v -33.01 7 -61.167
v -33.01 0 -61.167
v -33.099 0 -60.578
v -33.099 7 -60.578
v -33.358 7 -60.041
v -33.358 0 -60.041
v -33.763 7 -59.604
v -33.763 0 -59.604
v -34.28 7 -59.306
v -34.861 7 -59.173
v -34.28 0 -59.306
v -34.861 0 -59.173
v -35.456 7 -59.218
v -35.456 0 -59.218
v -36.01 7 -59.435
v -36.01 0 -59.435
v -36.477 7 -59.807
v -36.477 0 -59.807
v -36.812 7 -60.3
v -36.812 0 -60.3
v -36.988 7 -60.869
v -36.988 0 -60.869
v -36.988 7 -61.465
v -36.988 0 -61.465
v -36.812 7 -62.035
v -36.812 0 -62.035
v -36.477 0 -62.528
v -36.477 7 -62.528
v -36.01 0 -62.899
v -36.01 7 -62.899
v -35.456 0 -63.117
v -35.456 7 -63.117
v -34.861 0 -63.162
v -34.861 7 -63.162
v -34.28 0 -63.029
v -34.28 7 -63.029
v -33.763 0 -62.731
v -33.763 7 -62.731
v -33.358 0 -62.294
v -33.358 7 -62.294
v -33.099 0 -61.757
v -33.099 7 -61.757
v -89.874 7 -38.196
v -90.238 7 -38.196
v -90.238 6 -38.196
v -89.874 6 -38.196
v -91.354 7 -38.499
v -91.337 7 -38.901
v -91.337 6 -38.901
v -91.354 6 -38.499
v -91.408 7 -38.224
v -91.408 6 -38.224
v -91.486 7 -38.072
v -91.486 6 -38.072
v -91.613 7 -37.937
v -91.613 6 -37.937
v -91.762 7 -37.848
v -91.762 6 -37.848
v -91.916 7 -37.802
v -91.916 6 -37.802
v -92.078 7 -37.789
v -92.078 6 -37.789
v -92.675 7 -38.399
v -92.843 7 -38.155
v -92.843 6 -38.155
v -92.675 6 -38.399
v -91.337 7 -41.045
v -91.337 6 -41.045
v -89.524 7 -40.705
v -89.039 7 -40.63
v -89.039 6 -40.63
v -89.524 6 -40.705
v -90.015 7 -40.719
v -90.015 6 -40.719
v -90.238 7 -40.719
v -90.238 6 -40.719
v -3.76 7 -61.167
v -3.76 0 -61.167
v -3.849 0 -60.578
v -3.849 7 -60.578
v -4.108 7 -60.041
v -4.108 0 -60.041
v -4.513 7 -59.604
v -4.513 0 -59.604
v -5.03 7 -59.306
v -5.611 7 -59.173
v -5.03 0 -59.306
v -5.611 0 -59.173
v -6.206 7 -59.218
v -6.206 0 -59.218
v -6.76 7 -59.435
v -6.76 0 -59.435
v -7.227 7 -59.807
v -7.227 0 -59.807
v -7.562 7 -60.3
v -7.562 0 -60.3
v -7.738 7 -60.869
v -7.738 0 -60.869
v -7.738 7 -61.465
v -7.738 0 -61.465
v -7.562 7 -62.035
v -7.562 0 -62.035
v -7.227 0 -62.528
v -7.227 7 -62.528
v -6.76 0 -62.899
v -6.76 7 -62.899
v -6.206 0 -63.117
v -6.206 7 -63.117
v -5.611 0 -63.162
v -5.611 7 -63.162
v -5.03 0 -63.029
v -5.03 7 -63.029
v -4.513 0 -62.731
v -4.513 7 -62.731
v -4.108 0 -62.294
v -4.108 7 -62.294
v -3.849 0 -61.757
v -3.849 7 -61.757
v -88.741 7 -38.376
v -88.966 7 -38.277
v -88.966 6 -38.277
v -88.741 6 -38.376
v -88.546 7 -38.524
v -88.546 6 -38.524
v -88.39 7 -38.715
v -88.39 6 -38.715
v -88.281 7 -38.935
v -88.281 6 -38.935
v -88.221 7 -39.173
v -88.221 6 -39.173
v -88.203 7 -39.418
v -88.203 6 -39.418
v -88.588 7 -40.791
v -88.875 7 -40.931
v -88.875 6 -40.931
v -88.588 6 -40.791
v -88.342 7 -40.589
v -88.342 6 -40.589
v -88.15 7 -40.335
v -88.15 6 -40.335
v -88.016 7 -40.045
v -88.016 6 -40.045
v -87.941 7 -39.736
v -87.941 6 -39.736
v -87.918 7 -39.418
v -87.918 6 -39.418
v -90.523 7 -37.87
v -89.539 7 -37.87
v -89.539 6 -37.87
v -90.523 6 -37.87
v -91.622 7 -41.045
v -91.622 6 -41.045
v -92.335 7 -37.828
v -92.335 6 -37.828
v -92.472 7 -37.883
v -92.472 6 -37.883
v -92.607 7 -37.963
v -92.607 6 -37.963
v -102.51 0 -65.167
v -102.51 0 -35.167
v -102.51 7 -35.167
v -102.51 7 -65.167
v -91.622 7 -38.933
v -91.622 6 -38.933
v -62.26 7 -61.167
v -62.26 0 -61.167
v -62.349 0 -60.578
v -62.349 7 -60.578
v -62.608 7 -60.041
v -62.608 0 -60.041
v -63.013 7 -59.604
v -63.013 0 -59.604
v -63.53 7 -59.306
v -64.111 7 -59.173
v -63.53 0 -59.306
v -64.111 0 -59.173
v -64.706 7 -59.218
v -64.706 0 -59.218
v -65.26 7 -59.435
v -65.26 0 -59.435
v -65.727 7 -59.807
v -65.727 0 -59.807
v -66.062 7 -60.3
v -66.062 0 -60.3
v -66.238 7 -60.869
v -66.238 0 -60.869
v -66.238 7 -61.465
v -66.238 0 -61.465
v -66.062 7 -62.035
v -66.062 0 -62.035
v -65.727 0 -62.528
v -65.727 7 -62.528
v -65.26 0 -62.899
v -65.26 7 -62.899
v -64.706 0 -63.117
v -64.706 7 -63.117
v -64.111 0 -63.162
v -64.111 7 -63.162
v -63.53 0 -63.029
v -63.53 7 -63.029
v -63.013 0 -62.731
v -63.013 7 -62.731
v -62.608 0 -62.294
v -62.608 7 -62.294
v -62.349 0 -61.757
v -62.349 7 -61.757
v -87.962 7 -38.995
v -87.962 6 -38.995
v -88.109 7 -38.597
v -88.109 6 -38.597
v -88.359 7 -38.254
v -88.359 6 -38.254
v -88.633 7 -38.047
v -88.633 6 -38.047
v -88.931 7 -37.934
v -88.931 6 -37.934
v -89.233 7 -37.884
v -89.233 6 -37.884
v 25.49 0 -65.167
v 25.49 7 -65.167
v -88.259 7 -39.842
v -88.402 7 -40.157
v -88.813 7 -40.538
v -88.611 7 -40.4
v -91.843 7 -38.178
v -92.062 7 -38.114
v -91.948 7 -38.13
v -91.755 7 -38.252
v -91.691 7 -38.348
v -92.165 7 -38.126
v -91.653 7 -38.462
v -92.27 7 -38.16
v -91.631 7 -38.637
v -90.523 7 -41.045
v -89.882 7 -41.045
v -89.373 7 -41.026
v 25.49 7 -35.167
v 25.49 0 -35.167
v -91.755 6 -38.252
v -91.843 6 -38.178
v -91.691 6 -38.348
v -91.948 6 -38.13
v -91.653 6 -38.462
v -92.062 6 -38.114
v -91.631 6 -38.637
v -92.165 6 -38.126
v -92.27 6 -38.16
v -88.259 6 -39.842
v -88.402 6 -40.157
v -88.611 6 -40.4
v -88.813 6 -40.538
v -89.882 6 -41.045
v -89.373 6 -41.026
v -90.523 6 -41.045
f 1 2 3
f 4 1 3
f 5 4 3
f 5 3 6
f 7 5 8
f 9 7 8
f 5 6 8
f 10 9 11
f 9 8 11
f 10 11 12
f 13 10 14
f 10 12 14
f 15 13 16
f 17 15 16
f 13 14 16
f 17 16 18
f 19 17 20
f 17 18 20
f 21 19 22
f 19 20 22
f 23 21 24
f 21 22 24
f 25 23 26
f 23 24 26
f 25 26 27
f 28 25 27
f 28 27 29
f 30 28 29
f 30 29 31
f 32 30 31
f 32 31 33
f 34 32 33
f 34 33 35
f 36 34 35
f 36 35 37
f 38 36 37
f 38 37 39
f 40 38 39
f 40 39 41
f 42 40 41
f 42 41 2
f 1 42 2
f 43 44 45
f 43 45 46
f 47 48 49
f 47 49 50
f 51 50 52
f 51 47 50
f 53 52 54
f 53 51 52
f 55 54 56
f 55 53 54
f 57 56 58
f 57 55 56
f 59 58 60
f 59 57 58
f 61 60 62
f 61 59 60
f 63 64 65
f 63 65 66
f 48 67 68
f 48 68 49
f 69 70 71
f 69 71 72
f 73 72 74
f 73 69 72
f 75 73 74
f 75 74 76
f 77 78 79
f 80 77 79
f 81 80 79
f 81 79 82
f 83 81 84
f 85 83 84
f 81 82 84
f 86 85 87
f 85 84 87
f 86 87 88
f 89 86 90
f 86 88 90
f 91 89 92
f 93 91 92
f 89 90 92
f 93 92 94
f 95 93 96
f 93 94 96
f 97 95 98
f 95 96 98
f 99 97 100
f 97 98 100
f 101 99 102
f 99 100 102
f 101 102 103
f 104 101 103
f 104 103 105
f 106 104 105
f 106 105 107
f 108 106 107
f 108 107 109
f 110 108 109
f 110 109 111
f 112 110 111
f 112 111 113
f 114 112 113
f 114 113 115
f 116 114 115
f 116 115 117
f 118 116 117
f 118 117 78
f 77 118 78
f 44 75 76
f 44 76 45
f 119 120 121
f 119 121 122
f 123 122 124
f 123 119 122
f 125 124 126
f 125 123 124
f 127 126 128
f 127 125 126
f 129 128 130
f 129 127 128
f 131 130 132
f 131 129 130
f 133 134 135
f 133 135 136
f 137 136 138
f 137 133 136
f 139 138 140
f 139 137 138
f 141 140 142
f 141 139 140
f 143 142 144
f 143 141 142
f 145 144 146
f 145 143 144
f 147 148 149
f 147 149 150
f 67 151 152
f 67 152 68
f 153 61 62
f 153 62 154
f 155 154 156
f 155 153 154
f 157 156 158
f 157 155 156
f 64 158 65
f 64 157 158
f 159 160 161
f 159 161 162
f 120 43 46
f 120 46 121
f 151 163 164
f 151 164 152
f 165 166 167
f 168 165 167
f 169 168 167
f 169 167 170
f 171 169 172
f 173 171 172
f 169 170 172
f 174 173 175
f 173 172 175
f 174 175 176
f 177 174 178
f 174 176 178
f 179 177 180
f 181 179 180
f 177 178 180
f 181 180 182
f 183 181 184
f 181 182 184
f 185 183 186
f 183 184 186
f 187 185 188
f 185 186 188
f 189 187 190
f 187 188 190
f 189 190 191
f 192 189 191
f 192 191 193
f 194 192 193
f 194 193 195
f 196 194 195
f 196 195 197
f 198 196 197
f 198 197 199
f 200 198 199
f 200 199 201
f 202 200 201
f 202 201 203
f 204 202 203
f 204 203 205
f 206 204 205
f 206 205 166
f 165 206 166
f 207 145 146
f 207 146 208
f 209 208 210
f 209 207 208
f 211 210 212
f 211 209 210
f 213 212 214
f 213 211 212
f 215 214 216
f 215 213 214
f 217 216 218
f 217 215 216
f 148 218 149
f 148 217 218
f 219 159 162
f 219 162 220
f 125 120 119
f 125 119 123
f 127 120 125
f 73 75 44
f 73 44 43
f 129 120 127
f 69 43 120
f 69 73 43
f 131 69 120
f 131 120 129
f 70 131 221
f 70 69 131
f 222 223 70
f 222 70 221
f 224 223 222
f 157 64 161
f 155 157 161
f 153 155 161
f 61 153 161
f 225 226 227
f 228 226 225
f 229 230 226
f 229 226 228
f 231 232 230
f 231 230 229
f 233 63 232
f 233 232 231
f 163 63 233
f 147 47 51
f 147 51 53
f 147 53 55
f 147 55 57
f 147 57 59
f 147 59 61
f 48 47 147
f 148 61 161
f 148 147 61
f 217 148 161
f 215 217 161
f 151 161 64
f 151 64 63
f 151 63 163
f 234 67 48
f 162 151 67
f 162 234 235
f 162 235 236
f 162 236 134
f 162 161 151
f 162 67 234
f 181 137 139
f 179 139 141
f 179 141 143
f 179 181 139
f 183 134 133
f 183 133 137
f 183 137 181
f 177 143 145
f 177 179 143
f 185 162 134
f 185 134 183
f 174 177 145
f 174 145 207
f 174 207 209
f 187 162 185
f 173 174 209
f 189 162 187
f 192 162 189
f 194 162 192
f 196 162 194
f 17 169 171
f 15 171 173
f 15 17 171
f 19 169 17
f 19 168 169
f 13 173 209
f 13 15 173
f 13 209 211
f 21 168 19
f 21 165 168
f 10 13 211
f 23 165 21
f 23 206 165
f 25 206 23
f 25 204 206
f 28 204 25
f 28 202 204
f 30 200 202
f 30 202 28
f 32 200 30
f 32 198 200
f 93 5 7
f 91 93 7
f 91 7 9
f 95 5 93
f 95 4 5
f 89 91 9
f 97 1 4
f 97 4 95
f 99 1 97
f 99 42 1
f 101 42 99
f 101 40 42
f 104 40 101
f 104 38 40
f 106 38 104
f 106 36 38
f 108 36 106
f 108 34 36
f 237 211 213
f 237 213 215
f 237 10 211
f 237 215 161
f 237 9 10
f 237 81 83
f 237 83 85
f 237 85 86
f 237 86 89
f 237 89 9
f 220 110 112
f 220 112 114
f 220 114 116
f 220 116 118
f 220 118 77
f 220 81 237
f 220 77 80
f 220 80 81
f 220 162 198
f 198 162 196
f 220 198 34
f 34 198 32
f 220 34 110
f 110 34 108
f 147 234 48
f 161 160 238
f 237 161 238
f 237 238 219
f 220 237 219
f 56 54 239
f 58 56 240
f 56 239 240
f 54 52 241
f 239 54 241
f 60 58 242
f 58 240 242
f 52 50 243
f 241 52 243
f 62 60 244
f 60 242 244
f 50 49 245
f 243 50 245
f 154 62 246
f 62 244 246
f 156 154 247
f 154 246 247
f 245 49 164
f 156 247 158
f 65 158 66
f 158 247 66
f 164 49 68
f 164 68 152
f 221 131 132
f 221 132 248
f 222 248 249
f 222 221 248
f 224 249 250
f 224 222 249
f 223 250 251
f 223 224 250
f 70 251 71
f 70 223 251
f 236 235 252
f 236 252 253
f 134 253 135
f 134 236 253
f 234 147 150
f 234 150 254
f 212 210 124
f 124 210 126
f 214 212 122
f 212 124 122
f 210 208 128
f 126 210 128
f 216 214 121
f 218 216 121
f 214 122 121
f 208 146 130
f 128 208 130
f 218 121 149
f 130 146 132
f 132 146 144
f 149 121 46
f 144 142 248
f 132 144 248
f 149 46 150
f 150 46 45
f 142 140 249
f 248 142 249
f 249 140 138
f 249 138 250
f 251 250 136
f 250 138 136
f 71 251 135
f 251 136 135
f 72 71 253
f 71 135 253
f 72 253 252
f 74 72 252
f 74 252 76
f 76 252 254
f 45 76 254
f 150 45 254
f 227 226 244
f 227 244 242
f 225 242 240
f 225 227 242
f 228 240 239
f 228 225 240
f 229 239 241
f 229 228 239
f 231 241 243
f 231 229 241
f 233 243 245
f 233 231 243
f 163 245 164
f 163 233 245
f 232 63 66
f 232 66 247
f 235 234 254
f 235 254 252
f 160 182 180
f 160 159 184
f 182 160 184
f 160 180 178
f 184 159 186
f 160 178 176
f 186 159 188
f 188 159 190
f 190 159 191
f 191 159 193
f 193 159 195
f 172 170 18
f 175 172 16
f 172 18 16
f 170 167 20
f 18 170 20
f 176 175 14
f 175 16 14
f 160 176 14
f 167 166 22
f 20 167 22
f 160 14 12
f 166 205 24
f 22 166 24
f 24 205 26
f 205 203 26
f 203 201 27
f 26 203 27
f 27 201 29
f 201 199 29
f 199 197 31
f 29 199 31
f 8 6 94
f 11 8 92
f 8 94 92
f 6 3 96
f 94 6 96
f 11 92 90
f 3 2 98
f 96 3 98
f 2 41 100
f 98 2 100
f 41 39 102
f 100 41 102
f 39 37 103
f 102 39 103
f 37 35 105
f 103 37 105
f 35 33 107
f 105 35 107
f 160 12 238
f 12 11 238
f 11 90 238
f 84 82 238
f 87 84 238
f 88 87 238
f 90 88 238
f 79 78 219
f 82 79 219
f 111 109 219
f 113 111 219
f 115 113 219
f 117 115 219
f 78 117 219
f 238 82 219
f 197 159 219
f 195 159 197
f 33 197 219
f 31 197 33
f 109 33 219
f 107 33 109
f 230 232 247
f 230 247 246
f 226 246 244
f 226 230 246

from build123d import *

# Parameters (mm, degrees)
SKETCH1_W           = 128
SKETCH1_H           = 30
BOSS_EXTRUDE1_DEPTH = 7
SKETCH2_R           = 2
CUT_EXTRUDE1_DEPTH  = 10
CUT_EXTRUDE2_DEPTH  = 1


with BuildPart() as part:
    # Sketch1 → Boss-Extrude1 (new body)
    with BuildSketch(Plane(origin=(0, 0, 0), x_dir=(1, 0, 0), z_dir=(0, 1, 0))):
        with Locations((-38.510460251, 50.167364017)):
            Rectangle(SKETCH1_W, SKETCH1_H)
    extrude(amount=BOSS_EXTRUDE1_DEPTH)

    # Sketch2 → Cut-Extrude1 (cut)
    with BuildSketch(Plane.XZ):
        with Locations((-64.260460251, -61.167364017)):
            Circle(SKETCH2_R)
        with Locations((-35.010460251, -61.167364017)):
            Circle(SKETCH2_R)
        with Locations((-5.760460251, -61.167364017)):
            Circle(SKETCH2_R)
    extrude(amount=-CUT_EXTRUDE1_DEPTH, mode=Mode.SUBTRACT)

    # Sketch3 → Cut-Extrude2 (cut)
    with BuildSketch(Plane(origin=(0, 7, 0), x_dir=(1, 0, 0), z_dir=(0, 1, 0))):
        with BuildLine():
            Line((-91.622128911, 41.045104689), (-91.337193013, 41.045104689))
            Line((-91.337193013, 41.045104689), (-91.337193013, 38.901089264))
            add(Edge.make_bspline(
                [(-91.337193013, 38.901089264), (-91.337477782, 38.861442431), (-91.338024574, 38.785315673), (-91.341031218, 38.675665781), (-91.346595158, 38.575543802), (-91.354700491, 38.484722068), (-91.365513845, 38.403485107), (-91.377888206, 38.331205218), (-91.392867674, 38.268485649), (-91.415425111, 38.19805929), (-91.452412907, 38.120821696), (-91.508081578, 38.037405238), (-91.577235614, 37.964440644), (-91.657337266, 37.901074244), (-91.749086623, 37.850585184), (-91.850594294, 37.814340129), (-91.961235412, 37.792232281), (-92.037978983, 37.789897381), (-92.077517533, 37.788694433)],
                knots=[0, 0, 0, 0, 0.000118942, 0.000228383, 0.000329037, 0.000419729, 0.000501854, 0.000574841, 0.000639631, 0.000695143, 0.000796428, 0.00089539, 0.00099483, 0.001096746, 0.001200653, 0.001307483, 0.001418995, 0.001537501, 0.001537501, 0.001537501, 0.001537501], degree=3))
            add(Edge.make_bspline(
                [(-92.077517533, 37.788694433), (-92.108322615, 37.7896747), (-92.17030448, 37.791647061), (-92.26255248, 37.807723187), (-92.354538559, 37.83250274), (-92.446750944, 37.868790809), (-92.54101147, 37.918144459), (-92.638596771, 37.982719257), (-92.740762094, 38.062394999), (-92.808056932, 38.123207811), (-92.843282757, 38.155040587)],
                knots=[0, 0, 0, 0, 9.2363e-05, 0.00018584, 0.000280112, 0.000377788, 0.000482474, 0.000598727, 0.000728365, 0.000870765, 0.000870765, 0.000870765, 0.000870765], degree=3))
            Line((-92.843282757, 38.155040587), (-92.675374103, 38.399271356))
            add(Edge.make_bspline(
                [(-92.675374103, 38.399271356), (-92.636636673, 38.372558361), (-92.563495353, 38.322120743), (-92.455994896, 38.257235898), (-92.360747479, 38.201605212), (-92.298442234, 38.17325493), (-92.269594856, 38.160128728)],
                knots=[0, 0, 0, 0, 0.000141121, 0.000266456, 0.000376665, 0.000471687, 0.000471687, 0.000471687, 0.000471687], degree=3))
            add(Edge.make_bspline(
                [(-92.269594856, 38.160128728), (-92.252101231, 38.15327122), (-92.217792336, 38.13982212), (-92.165336728, 38.124812627), (-92.113180516, 38.116609869), (-92.078602322, 38.11508466), (-92.061617092, 38.114335458)],
                knots=[0, 0, 0, 0, 5.6351e-05, 0.000110517, 0.000163322, 0.000214303, 0.000214303, 0.000214303, 0.000214303], degree=3))
            add(Edge.make_bspline(
                [(-92.061617092, 38.114335458), (-92.039679848, 38.115263225), (-91.996318006, 38.117097078), (-91.93330424, 38.13328892), (-91.873017311, 38.158003486), (-91.817618408, 38.194190588), (-91.766559521, 38.237217663), (-91.724429243, 38.289247756), (-91.689307171, 38.346911185), (-91.668171021, 38.401495289), (-91.654704692, 38.451276232), (-91.646157931, 38.497026291), (-91.638684289, 38.550512775), (-91.632169595, 38.611799528), (-91.62835554, 38.681009251), (-91.624076299, 38.757938723), (-91.622529384, 38.842781901), (-91.622266475, 38.90193755), (-91.622128911, 38.932890146)],
                knots=[0, 0, 0, 0, 6.5707e-05, 0.000129879, 0.000194019, 0.00026036, 0.000327553, 0.000393515, 0.000460269, 0.000529361, 0.000568242, 0.000614893, 0.000668861, 0.000730249, 0.000799717, 0.00087677, 0.000961382, 0.001054243, 0.001054243, 0.001054243, 0.001054243], degree=3))
            Line((-91.622128911, 38.932890146), (-91.622128911, 41.045104689))
        make_face()
        with BuildLine():
            Line((-90.523090449, 37.870104689), (-90.523090449, 41.045104689))
            Line((-90.523090449, 41.045104689), (-89.88198468, 41.045104689))
            add(Edge.make_bspline(
                [(-89.88198468, 41.045104689), (-89.826223526, 41.044703215), (-89.718493268, 41.043927569), (-89.562816262, 41.039009593), (-89.418776706, 41.03030967), (-89.286848327, 41.017637314), (-89.166668942, 41.002077062), (-89.058575061, 40.982573124), (-88.96200776, 40.959542427), (-88.902617625, 40.939906911), (-88.874532757, 40.930621516)],
                knots=[0, 0, 0, 0, 0.000167284, 0.000323191, 0.000467206, 0.000600108, 0.000720732, 0.000830638, 0.000929518, 0.001018226, 0.001018226, 0.001018226, 0.001018226], degree=3))
            add(Edge.make_bspline(
                [(-88.874532757, 40.930621516), (-88.837798243, 40.916623662), (-88.765162233, 40.888945378), (-88.661741486, 40.83673359), (-88.56438205, 40.777575991), (-88.472561826, 40.711394601), (-88.388378219, 40.636315513), (-88.308542484, 40.555528014), (-88.236320556, 40.466094306), (-88.170182316, 40.369869138), (-88.110550682, 40.267986062), (-88.058717303, 40.160639213), (-88.015669752, 40.048373746), (-87.979934468, 39.931501862), (-87.951770896, 39.809766576), (-87.932555858, 39.683026141), (-87.919882174, 39.551781447), (-87.918608499, 39.462723184), (-87.917962244, 39.417535579)],
                knots=[0, 0, 0, 0, 0.000117869, 0.000233066, 0.000346943, 0.000459403, 0.000572066, 0.000684957, 0.000799786, 0.0009164, 0.001034974, 0.001153596, 0.001273599, 0.001395318, 0.001519979, 0.001648073, 0.001779649, 0.001915175, 0.001915175, 0.001915175, 0.001915175], degree=3))
            add(Edge.make_bspline(
                [(-87.917962244, 39.417535579), (-87.918532808, 39.378291455), (-87.919657162, 39.300956811), (-87.929753042, 39.18698257), (-87.944427275, 39.076389544), (-87.96714594, 38.969704374), (-87.994725363, 38.865992347), (-88.030071414, 38.766358811), (-88.070562186, 38.669889784), (-88.117778861, 38.577889646), (-88.169614261, 38.490728301), (-88.225241842, 38.408563357), (-88.284602273, 38.332567263), (-88.348261597, 38.262509879), (-88.415397168, 38.198496819), (-88.486448525, 38.139993348), (-88.561599007, 38.088144188), (-88.64051202, 38.040911882), (-88.725489651, 37.999709131), (-88.818141473, 37.964847622), (-88.918862613, 37.935958193), (-89.027405845, 37.911854594), (-89.143958714, 37.89273447), (-89.268635491, 37.879919814), (-89.401244618, 37.871253939), (-89.492302951, 37.870495211), (-89.539171178, 37.870104689)],
                knots=[0, 0, 0, 0, 0.000117706, 0.000231952, 0.000343037, 0.000452182, 0.00055895, 0.000664755, 0.000769064, 0.000872602, 0.000974698, 0.001073133, 0.001170083, 0.001263736, 0.001356857, 0.001448148, 0.00153954, 0.00163051, 0.001723812, 0.001822446, 0.001927109, 0.0020379, 0.002155845, 0.002281218, 0.002413768, 0.002554351, 0.002554351, 0.002554351, 0.002554351], degree=3))
            Line((-89.539171178, 37.870104689), (-90.523090449, 37.870104689))
        make_face()
        with BuildLine():
            Line((-90.238154552, 38.195745715), (-89.873716451, 38.195745715))
            add(Edge.make_bspline(
                [(-89.873716451, 38.195745715), (-89.821348572, 38.195970774), (-89.720625962, 38.196403644), (-89.57579335, 38.200202036), (-89.443459897, 38.20640865), (-89.323606814, 38.215094614), (-89.21630177, 38.226586858), (-89.121320512, 38.239400162), (-89.038974384, 38.255363564), (-88.989145538, 38.269833363), (-88.966119295, 38.276519954)],
                knots=[0, 0, 0, 0, 0.000157102, 0.000302164, 0.000434608, 0.000554511, 0.000662606, 0.000758309, 0.000842005, 0.000913909, 0.000913909, 0.000913909, 0.000913909], degree=3))
            add(Edge.make_bspline(
                [(-88.966119295, 38.276519954), (-88.937137567, 38.286726724), (-88.879866338, 38.306896477), (-88.797424211, 38.34368807), (-88.720537499, 38.38726909), (-88.647866262, 38.435712582), (-88.580441368, 38.490727169), (-88.517463776, 38.551116566), (-88.459060285, 38.617188112), (-88.405834306, 38.688859802), (-88.358201773, 38.765685545), (-88.316952872, 38.846910058), (-88.28080184, 38.931643379), (-88.252427688, 39.021186687), (-88.230188551, 39.114739476), (-88.214436298, 39.212308326), (-88.204625798, 39.313875018), (-88.203481484, 39.382955873), (-88.202898142, 39.418171596)],
                knots=[0, 0, 0, 0, 9.2159e-05, 0.000182117, 0.000270395, 0.000357008, 0.000443824, 0.00053109, 0.000618505, 0.000708057, 0.0007986, 0.000889339, 0.000981122, 0.001074651, 0.001170759, 0.00126936, 0.001370936, 0.001476563, 0.001476563, 0.001476563, 0.001476563], degree=3))
            add(Edge.make_bspline(
                [(-88.202898142, 39.418171596), (-88.203363767, 39.45530411), (-88.204278491, 39.528251263), (-88.215775901, 39.63528568), (-88.232577598, 39.738228841), (-88.256874227, 39.837087633), (-88.28783581, 39.932054924), (-88.326475235, 40.02260548), (-88.370622811, 40.109695611), (-88.42314941, 40.191315214), (-88.480676412, 40.26850682), (-88.544519203, 40.339223065), (-88.613663481, 40.403625037), (-88.687355094, 40.462715699), (-88.767670891, 40.514117748), (-88.852718882, 40.560097809), (-88.943746741, 40.599119367), (-89.007076829, 40.619873764), (-89.039261323, 40.630421196)],
                knots=[0, 0, 0, 0, 0.000111349, 0.000218745, 0.000322574, 0.000424076, 0.000523836, 0.000621881, 0.000719165, 0.000816384, 0.000912677, 0.0010077, 0.001101747, 0.001195912, 0.001290646, 0.001387396, 0.001485691, 0.001587265, 0.001587265, 0.001587265, 0.001587265], degree=3))
            add(Edge.make_bspline(
                [(-89.039261323, 40.630421196), (-89.065887005, 40.637783955), (-89.122500512, 40.653439202), (-89.214883455, 40.670516504), (-89.318855769, 40.685579157), (-89.434879069, 40.698331807), (-89.5628211, 40.707482448), (-89.70278026, 40.714350712), (-89.854817044, 40.718983158), (-89.9602112, 40.719299485), (-90.014912364, 40.719463664)],
                knots=[0, 0, 0, 0, 8.2841e-05, 0.000176143, 0.000281561, 0.000398013, 0.000526208, 0.000666307, 0.00081838, 0.000982477, 0.000982477, 0.000982477, 0.000982477], degree=3))
            Line((-90.014912364, 40.719463664), (-90.238154552, 40.719463664))
            Line((-90.238154552, 40.719463664), (-90.238154552, 38.195745715))
        make_face(mode=Mode.SUBTRACT)
    extrude(amount=-CUT_EXTRUDE2_DEPTH, mode=Mode.SUBTRACT)


solid = part.part
